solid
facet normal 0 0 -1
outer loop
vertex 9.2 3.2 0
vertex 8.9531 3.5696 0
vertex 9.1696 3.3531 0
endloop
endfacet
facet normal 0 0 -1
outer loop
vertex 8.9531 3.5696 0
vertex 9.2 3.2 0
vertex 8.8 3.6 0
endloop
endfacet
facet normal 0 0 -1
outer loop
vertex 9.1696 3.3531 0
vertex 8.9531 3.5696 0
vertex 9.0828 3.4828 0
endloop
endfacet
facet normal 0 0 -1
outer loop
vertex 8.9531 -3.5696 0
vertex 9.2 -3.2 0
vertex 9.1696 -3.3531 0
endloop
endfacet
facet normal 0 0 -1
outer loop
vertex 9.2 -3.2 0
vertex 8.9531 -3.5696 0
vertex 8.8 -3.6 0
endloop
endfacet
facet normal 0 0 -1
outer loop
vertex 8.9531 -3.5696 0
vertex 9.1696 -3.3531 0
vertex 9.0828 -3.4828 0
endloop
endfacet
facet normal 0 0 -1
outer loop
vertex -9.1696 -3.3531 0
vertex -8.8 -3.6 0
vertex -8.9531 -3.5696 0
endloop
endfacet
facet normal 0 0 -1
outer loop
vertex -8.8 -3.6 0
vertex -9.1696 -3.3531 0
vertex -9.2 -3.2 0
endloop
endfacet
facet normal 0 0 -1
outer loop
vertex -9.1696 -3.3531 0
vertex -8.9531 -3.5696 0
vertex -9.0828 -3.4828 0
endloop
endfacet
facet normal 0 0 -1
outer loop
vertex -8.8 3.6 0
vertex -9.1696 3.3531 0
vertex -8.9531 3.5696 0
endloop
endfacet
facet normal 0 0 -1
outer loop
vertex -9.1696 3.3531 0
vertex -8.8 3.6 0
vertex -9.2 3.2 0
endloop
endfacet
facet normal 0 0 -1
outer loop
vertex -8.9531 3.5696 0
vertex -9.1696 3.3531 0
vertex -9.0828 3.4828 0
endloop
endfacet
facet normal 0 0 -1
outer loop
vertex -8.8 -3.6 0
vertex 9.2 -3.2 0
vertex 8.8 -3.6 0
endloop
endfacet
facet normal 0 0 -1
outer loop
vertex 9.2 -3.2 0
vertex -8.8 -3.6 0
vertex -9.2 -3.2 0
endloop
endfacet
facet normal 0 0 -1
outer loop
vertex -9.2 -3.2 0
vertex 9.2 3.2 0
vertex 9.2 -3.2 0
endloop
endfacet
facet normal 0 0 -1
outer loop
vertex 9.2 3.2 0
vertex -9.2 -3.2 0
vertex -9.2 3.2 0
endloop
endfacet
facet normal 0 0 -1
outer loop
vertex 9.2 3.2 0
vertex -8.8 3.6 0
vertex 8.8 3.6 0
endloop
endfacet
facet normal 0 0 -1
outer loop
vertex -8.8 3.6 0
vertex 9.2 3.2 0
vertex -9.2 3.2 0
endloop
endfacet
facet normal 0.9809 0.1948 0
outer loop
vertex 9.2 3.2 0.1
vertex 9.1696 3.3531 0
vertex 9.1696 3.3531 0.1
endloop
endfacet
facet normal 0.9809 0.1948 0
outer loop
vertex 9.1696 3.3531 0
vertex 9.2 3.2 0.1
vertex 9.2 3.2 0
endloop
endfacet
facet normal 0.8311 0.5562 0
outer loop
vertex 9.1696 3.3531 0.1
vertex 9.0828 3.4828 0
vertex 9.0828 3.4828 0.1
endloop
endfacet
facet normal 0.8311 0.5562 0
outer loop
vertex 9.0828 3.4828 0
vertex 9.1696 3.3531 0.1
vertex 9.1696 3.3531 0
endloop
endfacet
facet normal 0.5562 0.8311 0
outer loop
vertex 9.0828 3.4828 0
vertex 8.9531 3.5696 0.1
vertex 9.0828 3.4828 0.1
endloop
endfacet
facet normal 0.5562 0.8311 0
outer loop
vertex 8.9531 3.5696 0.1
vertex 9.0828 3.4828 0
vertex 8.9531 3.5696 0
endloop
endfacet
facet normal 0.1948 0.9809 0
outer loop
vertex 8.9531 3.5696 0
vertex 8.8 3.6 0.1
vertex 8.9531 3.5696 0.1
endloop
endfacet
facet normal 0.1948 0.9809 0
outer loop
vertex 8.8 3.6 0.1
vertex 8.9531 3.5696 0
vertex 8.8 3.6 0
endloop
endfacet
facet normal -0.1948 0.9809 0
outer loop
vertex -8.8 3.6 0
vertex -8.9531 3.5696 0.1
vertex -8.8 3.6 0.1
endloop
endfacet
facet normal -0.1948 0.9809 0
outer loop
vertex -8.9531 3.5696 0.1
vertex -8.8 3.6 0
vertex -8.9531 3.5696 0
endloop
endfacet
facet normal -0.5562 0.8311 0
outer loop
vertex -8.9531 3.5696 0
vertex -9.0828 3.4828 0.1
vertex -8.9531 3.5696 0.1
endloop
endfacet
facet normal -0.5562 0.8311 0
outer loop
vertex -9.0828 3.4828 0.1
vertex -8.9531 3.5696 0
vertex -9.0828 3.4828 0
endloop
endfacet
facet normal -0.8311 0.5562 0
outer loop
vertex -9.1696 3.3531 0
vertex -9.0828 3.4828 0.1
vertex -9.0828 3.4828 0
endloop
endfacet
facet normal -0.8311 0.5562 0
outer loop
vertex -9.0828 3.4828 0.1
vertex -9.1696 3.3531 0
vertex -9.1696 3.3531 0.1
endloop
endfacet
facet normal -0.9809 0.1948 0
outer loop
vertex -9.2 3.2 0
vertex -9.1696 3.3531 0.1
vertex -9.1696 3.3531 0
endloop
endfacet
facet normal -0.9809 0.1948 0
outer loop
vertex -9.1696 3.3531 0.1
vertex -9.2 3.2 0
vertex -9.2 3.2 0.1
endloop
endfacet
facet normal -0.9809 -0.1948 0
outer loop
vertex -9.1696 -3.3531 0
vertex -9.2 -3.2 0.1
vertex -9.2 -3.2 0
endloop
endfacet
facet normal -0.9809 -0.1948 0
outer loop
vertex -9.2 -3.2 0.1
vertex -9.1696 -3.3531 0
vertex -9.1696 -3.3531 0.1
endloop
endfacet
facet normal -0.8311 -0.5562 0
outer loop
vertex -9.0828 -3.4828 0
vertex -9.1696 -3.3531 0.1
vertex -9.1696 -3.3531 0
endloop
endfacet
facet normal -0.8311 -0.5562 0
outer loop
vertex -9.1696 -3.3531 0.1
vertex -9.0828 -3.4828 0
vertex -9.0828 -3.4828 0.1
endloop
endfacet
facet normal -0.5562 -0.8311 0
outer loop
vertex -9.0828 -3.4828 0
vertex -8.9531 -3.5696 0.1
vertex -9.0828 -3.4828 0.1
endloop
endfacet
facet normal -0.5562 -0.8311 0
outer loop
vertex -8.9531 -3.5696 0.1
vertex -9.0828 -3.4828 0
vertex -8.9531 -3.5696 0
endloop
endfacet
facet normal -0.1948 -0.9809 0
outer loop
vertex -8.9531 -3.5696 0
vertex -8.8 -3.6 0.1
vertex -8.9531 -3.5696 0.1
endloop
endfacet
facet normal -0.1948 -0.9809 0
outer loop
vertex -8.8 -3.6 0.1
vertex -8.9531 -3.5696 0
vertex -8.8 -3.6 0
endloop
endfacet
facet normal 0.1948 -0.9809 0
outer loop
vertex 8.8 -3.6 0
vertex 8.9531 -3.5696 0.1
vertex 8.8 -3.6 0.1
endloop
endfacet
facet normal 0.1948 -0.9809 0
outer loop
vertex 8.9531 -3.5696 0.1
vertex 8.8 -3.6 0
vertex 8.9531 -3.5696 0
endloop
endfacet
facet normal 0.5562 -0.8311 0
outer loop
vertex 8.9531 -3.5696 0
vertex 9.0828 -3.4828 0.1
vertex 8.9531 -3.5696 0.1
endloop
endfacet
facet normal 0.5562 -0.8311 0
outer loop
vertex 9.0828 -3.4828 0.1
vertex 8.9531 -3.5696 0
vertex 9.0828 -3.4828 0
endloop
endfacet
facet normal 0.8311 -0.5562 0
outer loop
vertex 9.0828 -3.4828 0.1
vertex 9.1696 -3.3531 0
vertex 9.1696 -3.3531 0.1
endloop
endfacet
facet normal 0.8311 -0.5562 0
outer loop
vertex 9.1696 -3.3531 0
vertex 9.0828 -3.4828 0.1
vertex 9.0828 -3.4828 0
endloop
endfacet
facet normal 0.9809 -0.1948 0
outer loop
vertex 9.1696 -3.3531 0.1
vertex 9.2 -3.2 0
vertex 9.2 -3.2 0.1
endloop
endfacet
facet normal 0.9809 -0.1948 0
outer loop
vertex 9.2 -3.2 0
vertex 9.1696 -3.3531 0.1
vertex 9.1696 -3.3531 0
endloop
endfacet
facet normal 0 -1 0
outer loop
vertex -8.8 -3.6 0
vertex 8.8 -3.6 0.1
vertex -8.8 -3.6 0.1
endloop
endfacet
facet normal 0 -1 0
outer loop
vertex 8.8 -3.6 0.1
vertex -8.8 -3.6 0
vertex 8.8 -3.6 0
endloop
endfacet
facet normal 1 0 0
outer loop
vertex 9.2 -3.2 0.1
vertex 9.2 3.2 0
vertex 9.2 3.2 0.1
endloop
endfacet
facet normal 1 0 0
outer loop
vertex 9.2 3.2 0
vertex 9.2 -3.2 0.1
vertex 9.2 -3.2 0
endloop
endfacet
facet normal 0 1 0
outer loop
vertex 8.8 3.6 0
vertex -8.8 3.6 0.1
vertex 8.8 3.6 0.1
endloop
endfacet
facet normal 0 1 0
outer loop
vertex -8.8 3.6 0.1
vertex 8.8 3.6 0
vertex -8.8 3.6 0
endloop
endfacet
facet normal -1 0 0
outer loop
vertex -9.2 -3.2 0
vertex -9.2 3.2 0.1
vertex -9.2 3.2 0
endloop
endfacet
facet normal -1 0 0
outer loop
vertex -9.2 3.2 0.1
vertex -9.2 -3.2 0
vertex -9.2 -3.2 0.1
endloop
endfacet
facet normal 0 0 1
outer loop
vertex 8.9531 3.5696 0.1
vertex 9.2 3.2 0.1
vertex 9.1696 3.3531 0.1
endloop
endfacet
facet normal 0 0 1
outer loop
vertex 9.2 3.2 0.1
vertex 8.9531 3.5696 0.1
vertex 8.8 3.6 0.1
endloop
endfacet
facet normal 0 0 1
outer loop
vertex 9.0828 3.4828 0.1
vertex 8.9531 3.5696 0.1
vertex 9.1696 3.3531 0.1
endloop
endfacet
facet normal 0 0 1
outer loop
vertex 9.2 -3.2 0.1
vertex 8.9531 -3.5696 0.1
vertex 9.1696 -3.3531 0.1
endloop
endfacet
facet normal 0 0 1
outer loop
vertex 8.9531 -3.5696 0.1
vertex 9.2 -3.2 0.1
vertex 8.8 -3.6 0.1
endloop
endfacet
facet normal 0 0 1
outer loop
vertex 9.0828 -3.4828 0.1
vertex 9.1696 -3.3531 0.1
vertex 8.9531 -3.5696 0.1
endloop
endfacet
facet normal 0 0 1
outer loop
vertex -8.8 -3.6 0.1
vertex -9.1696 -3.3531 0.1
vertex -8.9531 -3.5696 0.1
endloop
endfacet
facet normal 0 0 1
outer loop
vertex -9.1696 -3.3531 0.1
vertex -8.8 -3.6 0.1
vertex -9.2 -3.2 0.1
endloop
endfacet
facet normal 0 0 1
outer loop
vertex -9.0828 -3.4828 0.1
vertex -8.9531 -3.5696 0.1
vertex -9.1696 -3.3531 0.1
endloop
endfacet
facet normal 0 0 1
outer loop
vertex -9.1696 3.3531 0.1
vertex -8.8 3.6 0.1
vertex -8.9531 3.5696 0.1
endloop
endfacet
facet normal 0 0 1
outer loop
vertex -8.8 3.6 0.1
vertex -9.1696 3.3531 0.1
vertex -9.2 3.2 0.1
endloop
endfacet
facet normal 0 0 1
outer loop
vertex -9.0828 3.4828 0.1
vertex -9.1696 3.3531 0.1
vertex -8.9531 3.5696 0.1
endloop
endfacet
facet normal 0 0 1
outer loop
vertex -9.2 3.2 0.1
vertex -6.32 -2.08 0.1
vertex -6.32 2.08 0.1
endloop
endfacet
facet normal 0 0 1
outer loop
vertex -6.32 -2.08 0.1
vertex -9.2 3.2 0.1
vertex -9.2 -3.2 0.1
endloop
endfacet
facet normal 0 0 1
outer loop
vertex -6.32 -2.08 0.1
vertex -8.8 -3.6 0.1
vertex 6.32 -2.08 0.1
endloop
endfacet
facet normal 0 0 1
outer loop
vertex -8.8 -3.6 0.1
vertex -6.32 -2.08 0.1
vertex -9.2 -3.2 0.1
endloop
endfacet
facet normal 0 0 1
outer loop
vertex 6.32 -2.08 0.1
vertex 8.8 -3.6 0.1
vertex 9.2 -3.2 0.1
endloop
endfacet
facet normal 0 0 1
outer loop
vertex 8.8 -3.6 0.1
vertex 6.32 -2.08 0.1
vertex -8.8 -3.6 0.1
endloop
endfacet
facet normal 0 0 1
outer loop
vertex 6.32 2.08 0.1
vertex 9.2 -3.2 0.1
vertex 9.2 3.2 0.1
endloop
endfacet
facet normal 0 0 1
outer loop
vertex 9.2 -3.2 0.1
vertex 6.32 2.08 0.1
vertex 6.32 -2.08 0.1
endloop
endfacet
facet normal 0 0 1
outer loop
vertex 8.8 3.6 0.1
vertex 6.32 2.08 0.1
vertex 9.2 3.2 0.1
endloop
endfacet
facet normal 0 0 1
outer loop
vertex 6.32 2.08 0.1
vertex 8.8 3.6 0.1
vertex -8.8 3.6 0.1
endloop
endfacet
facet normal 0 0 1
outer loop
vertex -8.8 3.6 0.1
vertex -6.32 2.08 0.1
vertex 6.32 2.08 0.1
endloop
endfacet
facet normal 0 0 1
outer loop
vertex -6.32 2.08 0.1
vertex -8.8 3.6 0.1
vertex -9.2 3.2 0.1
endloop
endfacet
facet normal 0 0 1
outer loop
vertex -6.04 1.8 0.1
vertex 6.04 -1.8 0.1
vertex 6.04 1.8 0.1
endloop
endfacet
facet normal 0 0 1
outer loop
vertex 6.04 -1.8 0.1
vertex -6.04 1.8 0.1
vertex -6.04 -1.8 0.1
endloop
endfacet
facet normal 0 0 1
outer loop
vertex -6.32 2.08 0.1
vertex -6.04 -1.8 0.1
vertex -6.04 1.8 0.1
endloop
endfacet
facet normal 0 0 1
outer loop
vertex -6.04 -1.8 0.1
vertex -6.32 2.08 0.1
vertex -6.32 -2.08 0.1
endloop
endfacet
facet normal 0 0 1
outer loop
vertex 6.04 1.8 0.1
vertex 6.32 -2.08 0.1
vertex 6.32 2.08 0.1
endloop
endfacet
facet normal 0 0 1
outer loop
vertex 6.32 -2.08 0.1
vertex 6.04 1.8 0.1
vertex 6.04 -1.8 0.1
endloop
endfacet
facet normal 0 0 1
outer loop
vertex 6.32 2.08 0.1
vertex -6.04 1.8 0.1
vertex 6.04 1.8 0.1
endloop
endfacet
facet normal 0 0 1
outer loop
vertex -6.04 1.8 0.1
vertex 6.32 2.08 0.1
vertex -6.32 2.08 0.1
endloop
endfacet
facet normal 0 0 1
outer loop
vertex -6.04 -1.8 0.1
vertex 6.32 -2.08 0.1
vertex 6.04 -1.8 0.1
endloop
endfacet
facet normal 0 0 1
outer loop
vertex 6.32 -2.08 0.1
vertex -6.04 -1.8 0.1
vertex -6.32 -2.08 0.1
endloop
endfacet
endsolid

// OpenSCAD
// file: ../p/1-4cyli.scad
use <../lib.scad>
function ldraw_lib__1_4cyli() = [
// 0 Cylinder 0.25
// 0 Name: 1-4cyli.dat
// 0 Author: James Jessiman
// 0 !LDRAW_ORG Primitive UPDATE 2012-01
// 0 !LICENSE Licensed under CC BY 4.0 : see CAreadme.txt
// 
// 0 BFC CERTIFY CCW
  [0,"BFC","CERTIFY"],
  [0,"BFC","CCW"],
// 
// 0 !HISTORY 2002-03-23 [sbliss] Added BFC statement.
// 0 !HISTORY 2002-04-25 [PTadmin] Official Update 2002-02
// 0 !HISTORY 2007-06-22 [PTadmin] Header formatted for Contributor Agreement
// 0 !HISTORY 2008-07-01 [PTadmin] Official Update 2008-01
// 0 !HISTORY 2012-02-16 [Philo] Changed to CCW
// 0 !HISTORY 2012-03-30 [PTadmin] Official Update 2012-01
// 
// 
// 4 16 1 1 0 0.9239 1 0.3827 0.9239 0 0.3827 1 0 0
  [4,16,1,1,0,0.9239,1,0.3827,0.9239,0,0.3827,1,0,0],
// 5 24 1 0 0 1 1 0 0.9239 0 0.3827 1 0 -1
  [5,24,1,0,0,1,1,0,0.9239,0,0.3827,1,0,-1],
// 4 16 0.9239 1 0.3827 0.7071 1 0.7071 0.7071 0 0.7071 0.9239 0 0.3827
  [4,16,0.9239,1,0.3827,0.7071,1,0.7071,0.7071,0,0.7071,0.9239,0,0.3827],
// 5 24 0.9239 0 0.3827 0.9239 1 0.3827 0.7071 0 0.7071 1 0 0
  [5,24,0.9239,0,0.3827,0.9239,1,0.3827,0.7071,0,0.7071,1,0,0],
// 4 16 0.7071 1 0.7071 0.3827 1 0.9239 0.3827 0 0.9239 0.7071 0 0.7071
  [4,16,0.7071,1,0.7071,0.3827,1,0.9239,0.3827,0,0.9239,0.7071,0,0.7071],
// 5 24 0.7071 0 0.7071 0.7071 1 0.7071 0.3827 0 0.9239 0.9239 0 0.3827
  [5,24,0.7071,0,0.7071,0.7071,1,0.7071,0.3827,0,0.9239,0.9239,0,0.3827],
// 4 16 0.3827 1 0.9239 0 1 1 0 0 1 0.3827 0 0.9239
  [4,16,0.3827,1,0.9239,0,1,1,0,0,1,0.3827,0,0.9239],
// 5 24 0.3827 0 0.9239 0.3827 1 0.9239 0 0 1 0.7071 0 0.7071
  [5,24,0.3827,0,0.9239,0.3827,1,0.9239,0,0,1,0.7071,0,0.7071],
// 5 24 0 0 1 0 1 1 0.3827 0 0.9239 -1 0 1
  [5,24,0,0,1,0,1,1,0.3827,0,0.9239,-1,0,1],
];
module ldraw_lib__1_4cyli(step=0, col=false, unit=2/5, alt=false, line=0.2, solid=!$preview)
    makepoly(ldraw_lib__1_4cyli(), step=step, col=col, unit=unit, alt=alt, line=line, solid=solid);
ldraw_lib__1_4cyli(line=0.2);
// file: ../p/1-4chrd.scad
use <../lib.scad>
function ldraw_lib__1_4chrd() = [
// 0 Chord 0.25
// 0 Name: 1-4chrd.dat
// 0 Author: Max Martin Richter [MMR1988]
// 0 !LDRAW_ORG Primitive UPDATE 2023-05
// 0 !LICENSE Licensed under CC BY 4.0 : see CAreadme.txt
// 
// 0 BFC CERTIFY CCW
  [0,"BFC","CERTIFY"],
  [0,"BFC","CCW"],
// 
// 0 !HISTORY 2004-04-22 [PTadmin] Official Update 2004-02
// 0 !HISTORY 2007-10-09 [PTadmin] Header formatted for Contributor Agreement
// 0 !HISTORY 2008-07-01 [PTadmin] Official Update 2008-01
// 0 !HISTORY 2012-08-02 [MMR1988] Re-creation with PrimGen2 and Rectifier
// 0 !HISTORY 2012-08-09 [PTadmin] Official Update 2012-02
// 0 !HISTORY 2023-10-27 [OrionP] Change author to MMR1988 from hafhead
// 0 !HISTORY 2023-10-31 [OrionP] Official Update 2023-05
// 
// 4 16 0.9239 0 0.3827 0.3827 0 0.9239 0 0 1 1 0 0
  [4,16,0.9239,0,0.3827,0.3827,0,0.9239,0,0,1,1,0,0],
// 3 16 0.7071 0 0.7071 0.3827 0 0.9239 0.9239 0 0.3827
  [3,16,0.7071,0,0.7071,0.3827,0,0.9239,0.9239,0,0.3827],
];
module ldraw_lib__1_4chrd(step=0, col=false, unit=2/5, alt=false, line=0.2, solid=!$preview)
    makepoly(ldraw_lib__1_4chrd(), step=step, col=col, unit=unit, alt=alt, line=line, solid=solid);
ldraw_lib__1_4chrd(line=0.2);
// main file
use <../lib.scad>
use <../p/1-4chrd.scad>
use <../p/1-4cyli.scad>
function ldraw_lib__6347356e() = [
// 0 Sticker  0.9 x  2.3 with Dark Bluish Grey Open Rectangle
// 0 Name: 6347356e.dat
// 0 Author: Evert-Jan Boer [ejboer]
// 0 !LDRAW_ORG Part UPDATE 2024-08
// 0 !LICENSE Licensed under CC BY 4.0 : see CAreadme.txt
// 
// 0 BFC CERTIFY CCW
  [0,"BFC","CERTIFY"],
  [0,"BFC","CCW"],
// 
// 0 !KEYWORDS Republic Gunship, Set 75309, Star Wars
// 
// 0 !HISTORY 2024-09-30 [OrionP] Official Update 2024-08
// 
// 1 16 22 0 8 1 0 0 0 -1 0 0 0 1 1-4chrd.dat
  [1,16,22,0,8,1,0,0,0,-1,0,0,0,1, ldraw_lib__1_4chrd()],
// 1 16 22 0 -8 0 0 1 0 -1 0 -1 0 0 1-4chrd.dat
  [1,16,22,0,-8,0,0,1,0,-1,0,-1,0,0, ldraw_lib__1_4chrd()],
// 1 16 -22 0 -8 -1 0 0 0 -1 0 0 0 -1 1-4chrd.dat
  [1,16,-22,0,-8,-1,0,0,0,-1,0,0,0,-1, ldraw_lib__1_4chrd()],
// 1 16 -22 0 8 0 0 -1 0 -1 0 1 0 0 1-4chrd.dat
  [1,16,-22,0,8,0,0,-1,0,-1,0,1,0,0, ldraw_lib__1_4chrd()],
// 4 16 22 0 -9 -22 0 -9 -23 0 -8 23 0 -8
  [4,16,22,0,-9,-22,0,-9,-23,0,-8,23,0,-8],
// 4 16 23 0 8 23 0 -8 -23 0 -8 -23 0 8
  [4,16,23,0,8,23,0,-8,-23,0,-8,-23,0,8],
// 4 16 23 0 8 -23 0 8 -22 0 9 22 0 9
  [4,16,23,0,8,-23,0,8,-22,0,9,22,0,9],
// 
// 1 16 22 -.25 8 1 0 0 0 .25 0 0 0 1 1-4cyli.dat
  [1,16,22,-.25,8,1,0,0,0,.25,0,0,0,1, ldraw_lib__1_4cyli()],
// 1 16 -22 -.25 8 0 0 -1 0 .25 0 1 0 0 1-4cyli.dat
  [1,16,-22,-.25,8,0,0,-1,0,.25,0,1,0,0, ldraw_lib__1_4cyli()],
// 1 16 -22 -.25 -8 -1 0 0 0 .25 0 0 0 -1 1-4cyli.dat
  [1,16,-22,-.25,-8,-1,0,0,0,.25,0,0,0,-1, ldraw_lib__1_4cyli()],
// 1 16 22 -.25 -8 0 0 1 0 .25 0 -1 0 0 1-4cyli.dat
  [1,16,22,-.25,-8,0,0,1,0,.25,0,-1,0,0, ldraw_lib__1_4cyli()],
// 4 16 22 -.25 -9 -22 -.25 -9 -22 0 -9 22 0 -9
  [4,16,22,-.25,-9,-22,-.25,-9,-22,0,-9,22,0,-9],
// 4 16 23 -.25 8 23 -.25 -8 23 0 -8 23 0 8
  [4,16,23,-.25,8,23,-.25,-8,23,0,-8,23,0,8],
// 4 16 -22 -.25 9 22 -.25 9 22 0 9 -22 0 9
  [4,16,-22,-.25,9,22,-.25,9,22,0,9,-22,0,9],
// 
// 4 16 -23 -.25 -8 -23 -.25 8 -23 0 8 -23 0 -8
  [4,16,-23,-.25,-8,-23,-.25,8,-23,0,8,-23,0,-8],
// 1 16 22 -.25 8 1 0 0 0 1 0 0 0 1 1-4chrd.dat
  [1,16,22,-.25,8,1,0,0,0,1,0,0,0,1, ldraw_lib__1_4chrd()],
// 1 16 22 -.25 -8 0 0 1 0 1 0 -1 0 0 1-4chrd.dat
  [1,16,22,-.25,-8,0,0,1,0,1,0,-1,0,0, ldraw_lib__1_4chrd()],
// 1 16 -22 -.25 -8 -1 0 0 0 1 0 0 0 -1 1-4chrd.dat
  [1,16,-22,-.25,-8,-1,0,0,0,1,0,0,0,-1, ldraw_lib__1_4chrd()],
// 1 16 -22 -.25 8 0 0 -1 0 1 0 1 0 0 1-4chrd.dat
  [1,16,-22,-.25,8,0,0,-1,0,1,0,1,0,0, ldraw_lib__1_4chrd()],
// 4 16 -23 -.25 -8 -15.8 -.25 -5.2 -15.8 -.25 5.2 -23 -.25 8
  [4,16,-23,-.25,-8,-15.8,-.25,-5.2,-15.8,-.25,5.2,-23,-.25,8],
// 4 16 -23 -.25 -8 -22 -.25 -9 15.8 -.25 -5.2 -15.8 -.25 -5.2
  [4,16,-23,-.25,-8,-22,-.25,-9,15.8,-.25,-5.2,-15.8,-.25,-5.2],
// 4 16 23 -.25 -8 15.8 -.25 -5.2 -22 -.25 -9 22 -.25 -9
  [4,16,23,-.25,-8,15.8,-.25,-5.2,-22,-.25,-9,22,-.25,-9],
// 4 16 15.8 -.25 -5.2 23 -.25 -8 23 -.25 8 15.8 -.25 5.2
  [4,16,15.8,-.25,-5.2,23,-.25,-8,23,-.25,8,15.8,-.25,5.2],
// 4 16 23 -.25 8 22 -.25 9 -22 -.25 9 15.8 -.25 5.2
  [4,16,23,-.25,8,22,-.25,9,-22,-.25,9,15.8,-.25,5.2],
// 4 16 -23 -.25 8 -15.8 -.25 5.2 15.8 -.25 5.2 -22 -.25 9
  [4,16,-23,-.25,8,-15.8,-.25,5.2,15.8,-.25,5.2,-22,-.25,9],
// 4 16 -15.1 -.25 4.5 -15.1 -.25 -4.5 15.1 -.25 -4.5 15.1 -.25 4.5
  [4,16,-15.1,-.25,4.5,-15.1,-.25,-4.5,15.1,-.25,-4.5,15.1,-.25,4.5],
// 
// 0 BFC NOCLIP
  [0,"BFC","NOCLIP"],
// 4 72 -15.1 -.25 4.5 -15.8 -.25 5.2 -15.8 -.25 -5.2 -15.1 -.25 -4.5
  [4,72,-15.1,-.25,4.5,-15.8,-.25,5.2,-15.8,-.25,-5.2,-15.1,-.25,-4.5],
// 4 72 15.8 -.25 -5.2 15.8 -.25 5.2 15.1 -.25 4.5 15.1 -.25 -4.5
  [4,72,15.8,-.25,-5.2,15.8,-.25,5.2,15.1,-.25,4.5,15.1,-.25,-4.5],
// 4 72 -15.1 -.25 4.5 15.1 -.25 4.5 15.8 -.25 5.2 -15.8 -.25 5.2
  [4,72,-15.1,-.25,4.5,15.1,-.25,4.5,15.8,-.25,5.2,-15.8,-.25,5.2],
// 4 72 -15.8 -.25 -5.2 15.8 -.25 -5.2 15.1 -.25 -4.5 -15.1 -.25 -4.5
  [4,72,-15.8,-.25,-5.2,15.8,-.25,-5.2,15.1,-.25,-4.5,-15.1,-.25,-4.5],
];
module ldraw_lib__6347356e(step=0, col=false, unit=2/5, alt=false, line=0.2, solid=!$preview)
    makepoly(ldraw_lib__6347356e(), step=step, col=col, unit=unit, alt=alt, line=line, solid=solid);
ldraw_lib__6347356e(line=0.2);
